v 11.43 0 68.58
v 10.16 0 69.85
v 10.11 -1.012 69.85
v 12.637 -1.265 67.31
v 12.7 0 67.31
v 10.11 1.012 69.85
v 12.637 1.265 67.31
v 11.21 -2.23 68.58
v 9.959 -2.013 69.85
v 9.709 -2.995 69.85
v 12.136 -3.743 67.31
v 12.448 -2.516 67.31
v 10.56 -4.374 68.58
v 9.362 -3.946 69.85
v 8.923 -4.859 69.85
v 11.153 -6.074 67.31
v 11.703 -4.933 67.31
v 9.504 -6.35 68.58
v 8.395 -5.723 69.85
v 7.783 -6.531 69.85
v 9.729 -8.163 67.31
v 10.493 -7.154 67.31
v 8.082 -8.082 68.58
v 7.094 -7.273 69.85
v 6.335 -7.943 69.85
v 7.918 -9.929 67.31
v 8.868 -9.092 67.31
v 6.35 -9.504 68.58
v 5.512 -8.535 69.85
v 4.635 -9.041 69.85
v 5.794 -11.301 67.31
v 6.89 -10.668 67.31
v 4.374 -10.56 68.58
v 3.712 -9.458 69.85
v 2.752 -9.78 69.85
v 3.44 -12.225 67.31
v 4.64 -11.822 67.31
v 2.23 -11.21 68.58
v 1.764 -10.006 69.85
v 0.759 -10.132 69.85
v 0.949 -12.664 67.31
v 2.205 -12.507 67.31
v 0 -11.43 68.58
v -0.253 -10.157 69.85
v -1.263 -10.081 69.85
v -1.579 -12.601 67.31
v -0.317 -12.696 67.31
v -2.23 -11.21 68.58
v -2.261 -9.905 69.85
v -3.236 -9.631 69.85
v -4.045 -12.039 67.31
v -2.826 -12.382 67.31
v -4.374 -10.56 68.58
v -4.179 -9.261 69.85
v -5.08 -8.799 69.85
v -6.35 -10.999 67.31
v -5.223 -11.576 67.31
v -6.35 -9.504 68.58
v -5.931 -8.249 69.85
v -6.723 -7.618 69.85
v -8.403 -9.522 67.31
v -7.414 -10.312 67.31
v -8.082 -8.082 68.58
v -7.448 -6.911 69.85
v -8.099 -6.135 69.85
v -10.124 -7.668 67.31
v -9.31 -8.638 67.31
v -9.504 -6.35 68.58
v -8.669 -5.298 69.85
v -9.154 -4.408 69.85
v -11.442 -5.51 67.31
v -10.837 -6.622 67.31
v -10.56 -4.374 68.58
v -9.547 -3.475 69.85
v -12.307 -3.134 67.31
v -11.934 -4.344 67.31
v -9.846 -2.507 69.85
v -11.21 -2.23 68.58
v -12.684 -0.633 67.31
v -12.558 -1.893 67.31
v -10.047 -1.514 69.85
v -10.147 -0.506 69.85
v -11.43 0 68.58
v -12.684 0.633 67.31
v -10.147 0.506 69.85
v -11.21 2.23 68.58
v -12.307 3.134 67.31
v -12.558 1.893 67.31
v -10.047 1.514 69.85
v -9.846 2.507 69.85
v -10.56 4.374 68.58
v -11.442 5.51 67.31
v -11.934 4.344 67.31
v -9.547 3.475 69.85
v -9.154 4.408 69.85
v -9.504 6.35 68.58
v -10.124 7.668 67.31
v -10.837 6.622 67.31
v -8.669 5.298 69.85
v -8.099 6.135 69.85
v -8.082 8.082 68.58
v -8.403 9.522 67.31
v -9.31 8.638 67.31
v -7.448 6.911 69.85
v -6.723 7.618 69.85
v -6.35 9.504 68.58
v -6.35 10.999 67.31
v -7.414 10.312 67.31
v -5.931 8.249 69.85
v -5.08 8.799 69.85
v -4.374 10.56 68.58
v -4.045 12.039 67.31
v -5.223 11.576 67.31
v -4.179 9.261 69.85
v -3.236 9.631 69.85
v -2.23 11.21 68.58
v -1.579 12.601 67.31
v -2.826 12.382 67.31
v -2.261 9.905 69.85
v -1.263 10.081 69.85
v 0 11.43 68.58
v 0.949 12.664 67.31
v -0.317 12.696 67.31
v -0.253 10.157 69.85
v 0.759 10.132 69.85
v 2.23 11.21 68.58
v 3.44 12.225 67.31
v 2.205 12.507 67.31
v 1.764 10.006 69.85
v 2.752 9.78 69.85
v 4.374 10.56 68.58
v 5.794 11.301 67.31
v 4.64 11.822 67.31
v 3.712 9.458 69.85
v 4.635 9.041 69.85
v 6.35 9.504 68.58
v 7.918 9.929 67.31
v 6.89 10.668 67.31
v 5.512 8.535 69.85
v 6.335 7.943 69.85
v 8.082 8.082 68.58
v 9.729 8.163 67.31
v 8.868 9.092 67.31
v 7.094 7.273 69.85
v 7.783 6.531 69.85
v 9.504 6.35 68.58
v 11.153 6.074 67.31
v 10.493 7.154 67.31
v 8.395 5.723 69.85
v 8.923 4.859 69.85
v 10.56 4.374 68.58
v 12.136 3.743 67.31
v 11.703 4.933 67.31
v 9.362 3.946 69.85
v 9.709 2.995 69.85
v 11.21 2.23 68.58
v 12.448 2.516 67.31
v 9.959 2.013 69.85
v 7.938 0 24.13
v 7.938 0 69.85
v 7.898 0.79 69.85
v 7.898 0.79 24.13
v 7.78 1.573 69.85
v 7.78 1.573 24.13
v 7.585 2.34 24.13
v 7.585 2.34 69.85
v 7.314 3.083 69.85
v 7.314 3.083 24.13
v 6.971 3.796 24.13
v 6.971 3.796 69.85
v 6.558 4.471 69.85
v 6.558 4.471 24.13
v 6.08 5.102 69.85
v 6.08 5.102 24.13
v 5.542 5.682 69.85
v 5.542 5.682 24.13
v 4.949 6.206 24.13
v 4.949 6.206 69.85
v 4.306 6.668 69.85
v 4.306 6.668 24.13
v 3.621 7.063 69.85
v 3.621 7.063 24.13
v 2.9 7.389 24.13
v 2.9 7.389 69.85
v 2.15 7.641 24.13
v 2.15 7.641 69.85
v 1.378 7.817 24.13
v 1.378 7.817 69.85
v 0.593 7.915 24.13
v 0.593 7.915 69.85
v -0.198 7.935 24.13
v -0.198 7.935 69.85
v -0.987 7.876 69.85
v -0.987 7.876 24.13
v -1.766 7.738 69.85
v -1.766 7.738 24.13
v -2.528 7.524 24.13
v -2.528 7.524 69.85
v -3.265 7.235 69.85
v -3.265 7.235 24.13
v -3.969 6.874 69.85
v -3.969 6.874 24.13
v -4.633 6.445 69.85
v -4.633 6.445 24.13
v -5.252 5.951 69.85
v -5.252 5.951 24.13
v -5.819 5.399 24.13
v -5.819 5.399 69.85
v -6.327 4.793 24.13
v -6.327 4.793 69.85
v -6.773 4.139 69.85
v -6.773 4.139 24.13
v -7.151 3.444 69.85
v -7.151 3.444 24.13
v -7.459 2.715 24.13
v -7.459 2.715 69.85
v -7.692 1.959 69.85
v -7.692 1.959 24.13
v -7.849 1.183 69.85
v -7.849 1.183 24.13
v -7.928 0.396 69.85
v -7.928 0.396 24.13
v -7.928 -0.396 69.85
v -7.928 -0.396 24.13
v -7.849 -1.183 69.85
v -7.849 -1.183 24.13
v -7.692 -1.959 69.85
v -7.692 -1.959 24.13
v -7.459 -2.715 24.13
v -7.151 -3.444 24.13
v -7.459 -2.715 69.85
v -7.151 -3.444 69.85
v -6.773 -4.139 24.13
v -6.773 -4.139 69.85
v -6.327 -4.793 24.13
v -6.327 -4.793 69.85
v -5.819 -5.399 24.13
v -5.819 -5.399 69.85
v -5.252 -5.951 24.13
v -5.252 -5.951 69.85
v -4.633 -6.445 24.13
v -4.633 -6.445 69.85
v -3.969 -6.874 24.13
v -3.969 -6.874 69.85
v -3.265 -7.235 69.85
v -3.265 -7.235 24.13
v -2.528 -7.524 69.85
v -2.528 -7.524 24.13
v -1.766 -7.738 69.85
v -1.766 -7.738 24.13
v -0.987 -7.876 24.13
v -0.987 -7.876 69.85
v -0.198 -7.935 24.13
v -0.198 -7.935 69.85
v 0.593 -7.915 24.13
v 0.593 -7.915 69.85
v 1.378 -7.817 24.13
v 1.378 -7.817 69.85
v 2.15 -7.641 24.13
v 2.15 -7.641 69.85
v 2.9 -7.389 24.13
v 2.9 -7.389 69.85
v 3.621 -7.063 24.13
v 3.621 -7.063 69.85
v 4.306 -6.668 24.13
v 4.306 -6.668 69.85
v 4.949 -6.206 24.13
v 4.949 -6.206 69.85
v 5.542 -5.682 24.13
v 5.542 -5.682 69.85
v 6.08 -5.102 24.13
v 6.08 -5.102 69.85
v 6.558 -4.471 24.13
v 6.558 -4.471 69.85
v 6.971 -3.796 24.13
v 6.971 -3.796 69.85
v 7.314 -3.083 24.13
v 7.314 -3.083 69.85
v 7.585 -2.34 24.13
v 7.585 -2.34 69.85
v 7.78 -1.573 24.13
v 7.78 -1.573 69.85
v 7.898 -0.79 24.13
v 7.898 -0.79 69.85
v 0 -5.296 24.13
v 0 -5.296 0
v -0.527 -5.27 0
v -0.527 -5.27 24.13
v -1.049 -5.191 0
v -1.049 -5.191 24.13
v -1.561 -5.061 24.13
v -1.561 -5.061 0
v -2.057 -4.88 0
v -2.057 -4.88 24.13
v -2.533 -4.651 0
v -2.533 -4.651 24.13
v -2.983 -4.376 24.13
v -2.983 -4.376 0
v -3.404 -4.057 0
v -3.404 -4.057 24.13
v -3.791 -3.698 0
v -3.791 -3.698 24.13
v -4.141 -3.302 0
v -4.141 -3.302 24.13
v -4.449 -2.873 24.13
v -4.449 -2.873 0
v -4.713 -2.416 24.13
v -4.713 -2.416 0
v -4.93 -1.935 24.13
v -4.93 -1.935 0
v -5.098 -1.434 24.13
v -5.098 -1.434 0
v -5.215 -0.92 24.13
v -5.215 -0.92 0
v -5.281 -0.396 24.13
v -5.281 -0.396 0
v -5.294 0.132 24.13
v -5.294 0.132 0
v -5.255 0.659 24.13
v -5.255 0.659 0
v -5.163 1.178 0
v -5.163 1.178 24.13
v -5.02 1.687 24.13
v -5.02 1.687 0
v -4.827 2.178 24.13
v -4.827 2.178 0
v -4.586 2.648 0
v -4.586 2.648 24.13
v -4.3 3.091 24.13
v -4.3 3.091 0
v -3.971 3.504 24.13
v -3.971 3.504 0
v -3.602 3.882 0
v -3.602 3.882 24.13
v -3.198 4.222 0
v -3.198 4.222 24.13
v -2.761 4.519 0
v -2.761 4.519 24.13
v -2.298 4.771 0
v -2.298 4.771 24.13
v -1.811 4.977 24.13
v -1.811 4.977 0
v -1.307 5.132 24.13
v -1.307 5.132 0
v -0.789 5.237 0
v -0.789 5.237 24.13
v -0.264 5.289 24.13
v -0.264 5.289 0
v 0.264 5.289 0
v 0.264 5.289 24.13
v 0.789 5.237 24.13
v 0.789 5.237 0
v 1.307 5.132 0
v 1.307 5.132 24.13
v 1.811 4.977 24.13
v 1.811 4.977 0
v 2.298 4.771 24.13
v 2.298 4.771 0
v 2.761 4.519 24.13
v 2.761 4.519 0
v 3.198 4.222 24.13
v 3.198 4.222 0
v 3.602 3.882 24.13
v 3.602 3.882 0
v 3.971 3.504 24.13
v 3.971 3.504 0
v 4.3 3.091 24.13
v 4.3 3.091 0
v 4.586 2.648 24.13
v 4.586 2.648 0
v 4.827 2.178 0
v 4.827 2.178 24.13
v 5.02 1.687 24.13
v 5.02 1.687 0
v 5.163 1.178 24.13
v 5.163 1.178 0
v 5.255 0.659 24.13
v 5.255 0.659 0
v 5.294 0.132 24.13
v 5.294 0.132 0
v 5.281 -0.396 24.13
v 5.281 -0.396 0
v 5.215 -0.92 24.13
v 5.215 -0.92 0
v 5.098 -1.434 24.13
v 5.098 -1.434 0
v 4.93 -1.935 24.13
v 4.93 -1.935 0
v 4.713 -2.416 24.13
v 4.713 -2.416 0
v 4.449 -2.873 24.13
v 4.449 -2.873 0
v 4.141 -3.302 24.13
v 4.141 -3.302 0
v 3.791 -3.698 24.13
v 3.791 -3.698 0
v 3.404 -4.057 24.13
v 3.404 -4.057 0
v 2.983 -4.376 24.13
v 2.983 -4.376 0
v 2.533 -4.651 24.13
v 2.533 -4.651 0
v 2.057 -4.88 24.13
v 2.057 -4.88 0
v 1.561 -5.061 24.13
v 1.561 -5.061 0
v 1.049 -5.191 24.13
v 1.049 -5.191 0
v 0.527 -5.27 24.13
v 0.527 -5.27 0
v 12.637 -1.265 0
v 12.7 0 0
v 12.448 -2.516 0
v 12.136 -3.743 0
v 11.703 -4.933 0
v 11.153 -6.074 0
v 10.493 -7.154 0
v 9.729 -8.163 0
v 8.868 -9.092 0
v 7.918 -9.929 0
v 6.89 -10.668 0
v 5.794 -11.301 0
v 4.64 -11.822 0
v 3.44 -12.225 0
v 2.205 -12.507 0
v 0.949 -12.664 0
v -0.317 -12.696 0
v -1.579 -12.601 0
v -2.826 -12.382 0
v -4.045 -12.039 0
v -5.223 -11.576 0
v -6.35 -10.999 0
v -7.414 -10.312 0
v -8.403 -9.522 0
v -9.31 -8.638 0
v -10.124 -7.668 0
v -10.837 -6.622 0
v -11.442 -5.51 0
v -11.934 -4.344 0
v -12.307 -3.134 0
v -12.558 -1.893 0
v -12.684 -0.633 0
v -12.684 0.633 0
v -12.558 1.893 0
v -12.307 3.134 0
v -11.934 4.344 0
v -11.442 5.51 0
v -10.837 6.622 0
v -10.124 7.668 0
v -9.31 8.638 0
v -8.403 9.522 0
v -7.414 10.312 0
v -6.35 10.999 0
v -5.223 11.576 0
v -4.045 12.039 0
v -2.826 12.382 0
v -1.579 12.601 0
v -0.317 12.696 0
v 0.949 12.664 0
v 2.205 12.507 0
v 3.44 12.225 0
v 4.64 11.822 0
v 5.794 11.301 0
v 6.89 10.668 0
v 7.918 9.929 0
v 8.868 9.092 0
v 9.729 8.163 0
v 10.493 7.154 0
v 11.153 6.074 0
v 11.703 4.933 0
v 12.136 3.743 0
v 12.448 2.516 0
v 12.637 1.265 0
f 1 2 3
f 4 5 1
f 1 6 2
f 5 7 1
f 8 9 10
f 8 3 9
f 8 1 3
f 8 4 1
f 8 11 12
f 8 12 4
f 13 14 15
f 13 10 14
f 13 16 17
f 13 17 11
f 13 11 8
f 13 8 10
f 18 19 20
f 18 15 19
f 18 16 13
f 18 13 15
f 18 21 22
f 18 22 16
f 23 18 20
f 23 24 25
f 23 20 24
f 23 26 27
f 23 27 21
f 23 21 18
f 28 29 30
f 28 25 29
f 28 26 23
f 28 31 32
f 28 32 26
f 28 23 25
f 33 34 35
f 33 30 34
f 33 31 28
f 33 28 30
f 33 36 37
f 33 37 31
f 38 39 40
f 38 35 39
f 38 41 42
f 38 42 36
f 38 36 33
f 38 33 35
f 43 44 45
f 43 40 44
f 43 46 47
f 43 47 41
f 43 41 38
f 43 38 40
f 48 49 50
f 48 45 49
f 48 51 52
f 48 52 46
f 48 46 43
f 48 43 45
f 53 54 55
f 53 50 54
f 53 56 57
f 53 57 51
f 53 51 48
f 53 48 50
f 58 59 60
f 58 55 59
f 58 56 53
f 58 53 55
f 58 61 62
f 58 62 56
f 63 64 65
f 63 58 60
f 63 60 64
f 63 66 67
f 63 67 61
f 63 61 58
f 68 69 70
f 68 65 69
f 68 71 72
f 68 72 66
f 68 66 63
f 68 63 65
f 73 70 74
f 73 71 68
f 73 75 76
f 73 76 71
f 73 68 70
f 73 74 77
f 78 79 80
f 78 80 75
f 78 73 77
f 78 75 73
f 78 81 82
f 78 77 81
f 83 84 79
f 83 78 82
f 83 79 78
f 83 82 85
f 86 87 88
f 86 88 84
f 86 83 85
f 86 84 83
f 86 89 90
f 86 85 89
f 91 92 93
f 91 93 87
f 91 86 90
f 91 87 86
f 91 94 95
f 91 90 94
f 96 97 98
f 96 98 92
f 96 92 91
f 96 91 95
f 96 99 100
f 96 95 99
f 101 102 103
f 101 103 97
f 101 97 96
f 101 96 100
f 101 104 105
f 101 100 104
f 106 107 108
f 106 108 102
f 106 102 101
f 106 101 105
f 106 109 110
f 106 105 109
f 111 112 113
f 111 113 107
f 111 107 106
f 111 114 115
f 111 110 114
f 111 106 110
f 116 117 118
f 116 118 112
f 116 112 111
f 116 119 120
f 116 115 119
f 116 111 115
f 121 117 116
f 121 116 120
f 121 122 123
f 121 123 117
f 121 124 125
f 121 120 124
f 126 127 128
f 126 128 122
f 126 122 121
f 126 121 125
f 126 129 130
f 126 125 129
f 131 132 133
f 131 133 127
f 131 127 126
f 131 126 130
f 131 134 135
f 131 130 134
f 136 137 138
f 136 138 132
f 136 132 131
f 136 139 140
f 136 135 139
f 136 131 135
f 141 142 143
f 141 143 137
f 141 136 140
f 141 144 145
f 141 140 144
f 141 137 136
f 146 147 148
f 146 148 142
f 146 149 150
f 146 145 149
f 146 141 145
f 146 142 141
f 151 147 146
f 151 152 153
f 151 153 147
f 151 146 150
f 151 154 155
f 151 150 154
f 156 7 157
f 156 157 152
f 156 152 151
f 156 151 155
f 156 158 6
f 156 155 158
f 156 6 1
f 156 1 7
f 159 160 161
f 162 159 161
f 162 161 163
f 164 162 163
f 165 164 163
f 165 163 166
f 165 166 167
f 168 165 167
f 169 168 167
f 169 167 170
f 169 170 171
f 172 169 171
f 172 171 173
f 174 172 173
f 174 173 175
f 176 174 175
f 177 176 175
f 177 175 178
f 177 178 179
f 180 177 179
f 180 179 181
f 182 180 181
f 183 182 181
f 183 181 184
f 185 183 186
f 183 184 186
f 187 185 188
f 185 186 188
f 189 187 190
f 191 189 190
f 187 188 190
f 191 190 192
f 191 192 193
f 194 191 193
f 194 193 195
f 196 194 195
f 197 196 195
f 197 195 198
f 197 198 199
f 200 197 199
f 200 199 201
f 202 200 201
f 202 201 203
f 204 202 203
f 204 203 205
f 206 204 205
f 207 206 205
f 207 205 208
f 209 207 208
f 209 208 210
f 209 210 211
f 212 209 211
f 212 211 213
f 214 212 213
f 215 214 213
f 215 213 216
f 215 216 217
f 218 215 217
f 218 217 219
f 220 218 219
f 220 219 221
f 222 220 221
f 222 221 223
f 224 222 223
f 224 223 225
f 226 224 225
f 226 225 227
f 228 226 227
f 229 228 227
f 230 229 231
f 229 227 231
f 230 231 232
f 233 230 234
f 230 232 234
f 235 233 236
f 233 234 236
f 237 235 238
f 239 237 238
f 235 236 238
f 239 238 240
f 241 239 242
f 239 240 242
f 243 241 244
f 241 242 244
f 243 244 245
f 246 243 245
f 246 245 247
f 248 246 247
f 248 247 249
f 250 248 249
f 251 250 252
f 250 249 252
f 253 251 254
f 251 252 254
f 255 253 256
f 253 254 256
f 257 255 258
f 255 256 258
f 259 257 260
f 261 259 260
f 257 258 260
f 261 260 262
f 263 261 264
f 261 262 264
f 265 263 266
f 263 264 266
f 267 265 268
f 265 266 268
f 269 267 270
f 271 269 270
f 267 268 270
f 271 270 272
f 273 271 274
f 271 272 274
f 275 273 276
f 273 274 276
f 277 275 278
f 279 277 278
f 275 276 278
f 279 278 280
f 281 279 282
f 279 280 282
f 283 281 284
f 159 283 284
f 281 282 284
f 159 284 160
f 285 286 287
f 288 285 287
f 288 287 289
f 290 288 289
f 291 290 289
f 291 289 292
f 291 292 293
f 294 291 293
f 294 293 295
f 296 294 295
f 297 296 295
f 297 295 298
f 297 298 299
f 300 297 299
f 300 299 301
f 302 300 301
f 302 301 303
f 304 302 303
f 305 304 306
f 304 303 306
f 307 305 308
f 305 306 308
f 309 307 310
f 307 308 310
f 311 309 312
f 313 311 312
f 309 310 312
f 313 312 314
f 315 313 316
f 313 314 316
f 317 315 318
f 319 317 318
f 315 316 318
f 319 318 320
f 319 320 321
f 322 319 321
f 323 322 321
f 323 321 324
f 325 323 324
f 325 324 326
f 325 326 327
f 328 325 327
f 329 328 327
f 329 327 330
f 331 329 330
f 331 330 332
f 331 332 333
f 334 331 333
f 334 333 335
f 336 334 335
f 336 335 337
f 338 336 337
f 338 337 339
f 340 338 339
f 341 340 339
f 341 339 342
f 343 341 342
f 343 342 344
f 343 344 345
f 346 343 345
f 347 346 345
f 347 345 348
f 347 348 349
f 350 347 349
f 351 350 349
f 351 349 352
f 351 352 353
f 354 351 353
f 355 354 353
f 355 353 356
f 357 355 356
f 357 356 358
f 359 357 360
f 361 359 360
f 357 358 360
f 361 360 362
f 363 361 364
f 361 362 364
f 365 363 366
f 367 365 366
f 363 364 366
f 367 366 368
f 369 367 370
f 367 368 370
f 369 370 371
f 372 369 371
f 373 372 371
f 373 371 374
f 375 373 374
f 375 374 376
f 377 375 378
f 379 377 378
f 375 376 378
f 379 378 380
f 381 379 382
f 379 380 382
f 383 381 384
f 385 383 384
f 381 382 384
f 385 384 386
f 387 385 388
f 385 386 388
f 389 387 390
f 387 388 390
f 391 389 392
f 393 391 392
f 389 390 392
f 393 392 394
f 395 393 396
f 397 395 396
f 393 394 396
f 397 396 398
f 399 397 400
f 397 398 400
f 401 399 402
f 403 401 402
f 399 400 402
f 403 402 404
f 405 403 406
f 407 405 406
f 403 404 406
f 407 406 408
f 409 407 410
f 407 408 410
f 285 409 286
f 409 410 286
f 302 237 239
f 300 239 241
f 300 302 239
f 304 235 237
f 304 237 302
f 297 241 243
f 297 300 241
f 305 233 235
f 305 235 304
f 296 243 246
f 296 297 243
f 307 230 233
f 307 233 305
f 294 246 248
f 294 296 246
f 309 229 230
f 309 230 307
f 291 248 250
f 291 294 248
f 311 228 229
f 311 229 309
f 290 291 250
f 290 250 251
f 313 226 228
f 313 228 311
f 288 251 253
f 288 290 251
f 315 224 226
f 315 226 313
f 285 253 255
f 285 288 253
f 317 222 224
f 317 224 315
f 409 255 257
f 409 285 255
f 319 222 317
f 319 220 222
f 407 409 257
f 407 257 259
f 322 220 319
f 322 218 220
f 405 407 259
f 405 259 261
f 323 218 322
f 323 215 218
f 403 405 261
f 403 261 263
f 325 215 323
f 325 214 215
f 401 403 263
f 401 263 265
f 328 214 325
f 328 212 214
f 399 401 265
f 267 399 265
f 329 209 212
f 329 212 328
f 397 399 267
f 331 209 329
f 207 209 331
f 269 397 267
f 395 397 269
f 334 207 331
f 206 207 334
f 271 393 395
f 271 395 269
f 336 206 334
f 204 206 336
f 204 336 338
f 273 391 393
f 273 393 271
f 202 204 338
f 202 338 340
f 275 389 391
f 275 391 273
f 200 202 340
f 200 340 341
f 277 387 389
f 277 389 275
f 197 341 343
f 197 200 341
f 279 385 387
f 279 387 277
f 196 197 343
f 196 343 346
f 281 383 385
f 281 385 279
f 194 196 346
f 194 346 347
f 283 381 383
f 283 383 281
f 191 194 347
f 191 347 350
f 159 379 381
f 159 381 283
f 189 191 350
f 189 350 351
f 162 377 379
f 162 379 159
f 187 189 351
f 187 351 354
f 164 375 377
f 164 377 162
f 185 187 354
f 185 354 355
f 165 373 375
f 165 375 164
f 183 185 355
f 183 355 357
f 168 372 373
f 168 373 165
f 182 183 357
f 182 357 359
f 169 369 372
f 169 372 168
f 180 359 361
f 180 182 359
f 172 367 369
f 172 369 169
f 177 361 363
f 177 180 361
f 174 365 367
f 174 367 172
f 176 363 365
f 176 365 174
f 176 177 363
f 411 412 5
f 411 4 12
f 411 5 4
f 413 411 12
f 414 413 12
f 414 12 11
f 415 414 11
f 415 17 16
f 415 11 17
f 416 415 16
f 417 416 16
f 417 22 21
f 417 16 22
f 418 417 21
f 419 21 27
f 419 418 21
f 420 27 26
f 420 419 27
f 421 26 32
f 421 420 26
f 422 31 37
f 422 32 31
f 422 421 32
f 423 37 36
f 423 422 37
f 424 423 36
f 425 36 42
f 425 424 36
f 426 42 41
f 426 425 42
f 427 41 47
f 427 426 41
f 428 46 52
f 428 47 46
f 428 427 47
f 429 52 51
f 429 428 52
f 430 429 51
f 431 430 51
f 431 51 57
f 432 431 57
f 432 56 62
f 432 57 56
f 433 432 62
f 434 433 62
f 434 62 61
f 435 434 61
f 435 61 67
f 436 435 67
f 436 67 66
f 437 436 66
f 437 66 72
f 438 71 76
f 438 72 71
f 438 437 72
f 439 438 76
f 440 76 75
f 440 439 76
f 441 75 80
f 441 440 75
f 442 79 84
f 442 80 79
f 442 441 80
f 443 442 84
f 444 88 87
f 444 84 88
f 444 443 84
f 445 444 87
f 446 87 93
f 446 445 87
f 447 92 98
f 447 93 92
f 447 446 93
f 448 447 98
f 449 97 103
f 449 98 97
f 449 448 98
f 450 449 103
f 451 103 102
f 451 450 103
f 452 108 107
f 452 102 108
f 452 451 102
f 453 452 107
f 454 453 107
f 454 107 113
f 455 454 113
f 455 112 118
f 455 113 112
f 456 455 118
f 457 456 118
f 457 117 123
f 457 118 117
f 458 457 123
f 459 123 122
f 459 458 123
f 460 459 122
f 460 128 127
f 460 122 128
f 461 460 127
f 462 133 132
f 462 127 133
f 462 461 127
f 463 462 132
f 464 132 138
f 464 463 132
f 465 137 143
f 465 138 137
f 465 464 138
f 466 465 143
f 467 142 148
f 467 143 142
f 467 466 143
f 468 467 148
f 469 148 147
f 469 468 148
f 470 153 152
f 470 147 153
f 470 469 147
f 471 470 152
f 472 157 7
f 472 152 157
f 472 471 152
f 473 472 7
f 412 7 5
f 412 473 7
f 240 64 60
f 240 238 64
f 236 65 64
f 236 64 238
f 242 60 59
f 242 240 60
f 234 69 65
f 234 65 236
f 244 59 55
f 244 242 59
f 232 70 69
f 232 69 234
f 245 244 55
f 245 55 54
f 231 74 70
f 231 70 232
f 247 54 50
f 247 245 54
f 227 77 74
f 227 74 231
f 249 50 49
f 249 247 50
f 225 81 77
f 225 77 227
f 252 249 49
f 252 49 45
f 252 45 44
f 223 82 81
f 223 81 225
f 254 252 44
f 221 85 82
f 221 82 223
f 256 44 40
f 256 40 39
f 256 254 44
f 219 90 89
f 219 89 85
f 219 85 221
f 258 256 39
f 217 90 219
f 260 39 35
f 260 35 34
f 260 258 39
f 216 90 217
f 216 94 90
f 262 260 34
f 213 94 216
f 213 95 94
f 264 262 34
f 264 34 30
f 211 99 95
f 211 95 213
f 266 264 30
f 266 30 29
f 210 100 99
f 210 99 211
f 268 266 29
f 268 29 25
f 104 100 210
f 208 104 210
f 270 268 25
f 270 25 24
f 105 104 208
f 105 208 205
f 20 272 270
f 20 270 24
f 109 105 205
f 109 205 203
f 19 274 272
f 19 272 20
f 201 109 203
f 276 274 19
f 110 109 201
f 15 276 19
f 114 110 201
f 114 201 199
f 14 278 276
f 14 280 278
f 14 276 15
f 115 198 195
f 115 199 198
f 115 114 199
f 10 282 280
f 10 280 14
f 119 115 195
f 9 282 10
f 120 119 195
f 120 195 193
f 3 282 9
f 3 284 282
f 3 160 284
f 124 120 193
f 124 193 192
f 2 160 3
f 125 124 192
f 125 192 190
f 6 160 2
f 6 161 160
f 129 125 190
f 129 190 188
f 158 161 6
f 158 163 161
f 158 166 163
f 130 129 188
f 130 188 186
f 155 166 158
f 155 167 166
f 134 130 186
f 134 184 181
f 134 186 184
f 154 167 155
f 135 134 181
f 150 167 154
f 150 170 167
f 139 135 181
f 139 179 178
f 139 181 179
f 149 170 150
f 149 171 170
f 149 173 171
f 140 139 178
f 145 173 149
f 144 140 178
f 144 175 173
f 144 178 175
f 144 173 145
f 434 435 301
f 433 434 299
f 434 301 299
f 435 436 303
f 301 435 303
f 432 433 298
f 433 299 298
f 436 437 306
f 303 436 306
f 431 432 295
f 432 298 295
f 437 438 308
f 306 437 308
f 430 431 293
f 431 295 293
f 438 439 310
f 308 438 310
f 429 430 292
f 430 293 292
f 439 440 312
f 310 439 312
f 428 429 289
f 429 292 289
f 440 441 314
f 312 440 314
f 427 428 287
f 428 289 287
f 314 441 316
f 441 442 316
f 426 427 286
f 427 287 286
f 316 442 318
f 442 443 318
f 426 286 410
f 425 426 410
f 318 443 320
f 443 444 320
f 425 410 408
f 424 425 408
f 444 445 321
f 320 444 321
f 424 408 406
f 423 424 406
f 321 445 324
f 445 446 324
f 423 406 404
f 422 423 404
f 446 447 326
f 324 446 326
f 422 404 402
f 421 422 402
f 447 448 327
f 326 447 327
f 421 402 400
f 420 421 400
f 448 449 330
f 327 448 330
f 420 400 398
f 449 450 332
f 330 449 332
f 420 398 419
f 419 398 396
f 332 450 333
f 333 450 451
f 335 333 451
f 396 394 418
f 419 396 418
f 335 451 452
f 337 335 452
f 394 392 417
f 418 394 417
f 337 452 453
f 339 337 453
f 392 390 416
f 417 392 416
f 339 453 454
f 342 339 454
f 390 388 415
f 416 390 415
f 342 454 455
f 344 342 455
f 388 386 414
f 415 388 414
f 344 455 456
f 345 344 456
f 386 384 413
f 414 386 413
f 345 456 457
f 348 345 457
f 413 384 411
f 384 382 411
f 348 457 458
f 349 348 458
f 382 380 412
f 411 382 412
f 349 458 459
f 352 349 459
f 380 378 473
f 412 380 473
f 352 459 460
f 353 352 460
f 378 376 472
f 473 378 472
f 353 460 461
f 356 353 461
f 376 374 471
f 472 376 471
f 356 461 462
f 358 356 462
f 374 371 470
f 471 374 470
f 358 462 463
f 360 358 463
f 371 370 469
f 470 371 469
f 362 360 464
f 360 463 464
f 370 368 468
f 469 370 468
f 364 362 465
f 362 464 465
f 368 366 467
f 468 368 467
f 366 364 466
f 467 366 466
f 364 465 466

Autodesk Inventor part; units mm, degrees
ref_plane "YZ Plane" through (0, 0, 0) normal (1, 0, 0) x (0, 1, 0)
ref_plane "XZ Plane" through (0, 0, 0) normal (0, 1, 0) x (-1, 0, 0)
ref_plane "XY Plane" through (0, 0, 0) normal (0, 0, 1) x (1, 0, 0)
sketch "Sketch1" plane through (0, 0, 0) normal (0, 0, 1) x (1, 0, 0)
  circle A0 centre (0, 0) radius 12.7
  dimension "d0" = 25.4
extrude "Extrusion1" add sketch "Sketch1" along normal blind 69.85
sketch "Sketch2" plane through (0, 0, 69.85) normal (0, 0, 1) x (1, 0, 0)
  circle A0 centre (0, 0) radius 7.9375
  dimension "d3" = 15.875
extrude "Extrusion2" cut sketch "Sketch2" against normal blind 45.72
sketch "Sketch3" plane through (0, 0, 24.13) normal (0, 0, 1) x (1, 0, 0)
  point P0 (0, 0)
  point P1 (0, 0)
hole "Hole1" at (0, 0, 24.13) direction (0, 0, -1) diameter 10.5918 end through all thread size "1/2-13 UNC" class "2B" standard "ANSI Unified Screw Threads"
chamfer "Chamfer1" distance 2.54 angle 45 1 edges at (-12.7, 0, 69.85)
properties part number "Top_attachment"
